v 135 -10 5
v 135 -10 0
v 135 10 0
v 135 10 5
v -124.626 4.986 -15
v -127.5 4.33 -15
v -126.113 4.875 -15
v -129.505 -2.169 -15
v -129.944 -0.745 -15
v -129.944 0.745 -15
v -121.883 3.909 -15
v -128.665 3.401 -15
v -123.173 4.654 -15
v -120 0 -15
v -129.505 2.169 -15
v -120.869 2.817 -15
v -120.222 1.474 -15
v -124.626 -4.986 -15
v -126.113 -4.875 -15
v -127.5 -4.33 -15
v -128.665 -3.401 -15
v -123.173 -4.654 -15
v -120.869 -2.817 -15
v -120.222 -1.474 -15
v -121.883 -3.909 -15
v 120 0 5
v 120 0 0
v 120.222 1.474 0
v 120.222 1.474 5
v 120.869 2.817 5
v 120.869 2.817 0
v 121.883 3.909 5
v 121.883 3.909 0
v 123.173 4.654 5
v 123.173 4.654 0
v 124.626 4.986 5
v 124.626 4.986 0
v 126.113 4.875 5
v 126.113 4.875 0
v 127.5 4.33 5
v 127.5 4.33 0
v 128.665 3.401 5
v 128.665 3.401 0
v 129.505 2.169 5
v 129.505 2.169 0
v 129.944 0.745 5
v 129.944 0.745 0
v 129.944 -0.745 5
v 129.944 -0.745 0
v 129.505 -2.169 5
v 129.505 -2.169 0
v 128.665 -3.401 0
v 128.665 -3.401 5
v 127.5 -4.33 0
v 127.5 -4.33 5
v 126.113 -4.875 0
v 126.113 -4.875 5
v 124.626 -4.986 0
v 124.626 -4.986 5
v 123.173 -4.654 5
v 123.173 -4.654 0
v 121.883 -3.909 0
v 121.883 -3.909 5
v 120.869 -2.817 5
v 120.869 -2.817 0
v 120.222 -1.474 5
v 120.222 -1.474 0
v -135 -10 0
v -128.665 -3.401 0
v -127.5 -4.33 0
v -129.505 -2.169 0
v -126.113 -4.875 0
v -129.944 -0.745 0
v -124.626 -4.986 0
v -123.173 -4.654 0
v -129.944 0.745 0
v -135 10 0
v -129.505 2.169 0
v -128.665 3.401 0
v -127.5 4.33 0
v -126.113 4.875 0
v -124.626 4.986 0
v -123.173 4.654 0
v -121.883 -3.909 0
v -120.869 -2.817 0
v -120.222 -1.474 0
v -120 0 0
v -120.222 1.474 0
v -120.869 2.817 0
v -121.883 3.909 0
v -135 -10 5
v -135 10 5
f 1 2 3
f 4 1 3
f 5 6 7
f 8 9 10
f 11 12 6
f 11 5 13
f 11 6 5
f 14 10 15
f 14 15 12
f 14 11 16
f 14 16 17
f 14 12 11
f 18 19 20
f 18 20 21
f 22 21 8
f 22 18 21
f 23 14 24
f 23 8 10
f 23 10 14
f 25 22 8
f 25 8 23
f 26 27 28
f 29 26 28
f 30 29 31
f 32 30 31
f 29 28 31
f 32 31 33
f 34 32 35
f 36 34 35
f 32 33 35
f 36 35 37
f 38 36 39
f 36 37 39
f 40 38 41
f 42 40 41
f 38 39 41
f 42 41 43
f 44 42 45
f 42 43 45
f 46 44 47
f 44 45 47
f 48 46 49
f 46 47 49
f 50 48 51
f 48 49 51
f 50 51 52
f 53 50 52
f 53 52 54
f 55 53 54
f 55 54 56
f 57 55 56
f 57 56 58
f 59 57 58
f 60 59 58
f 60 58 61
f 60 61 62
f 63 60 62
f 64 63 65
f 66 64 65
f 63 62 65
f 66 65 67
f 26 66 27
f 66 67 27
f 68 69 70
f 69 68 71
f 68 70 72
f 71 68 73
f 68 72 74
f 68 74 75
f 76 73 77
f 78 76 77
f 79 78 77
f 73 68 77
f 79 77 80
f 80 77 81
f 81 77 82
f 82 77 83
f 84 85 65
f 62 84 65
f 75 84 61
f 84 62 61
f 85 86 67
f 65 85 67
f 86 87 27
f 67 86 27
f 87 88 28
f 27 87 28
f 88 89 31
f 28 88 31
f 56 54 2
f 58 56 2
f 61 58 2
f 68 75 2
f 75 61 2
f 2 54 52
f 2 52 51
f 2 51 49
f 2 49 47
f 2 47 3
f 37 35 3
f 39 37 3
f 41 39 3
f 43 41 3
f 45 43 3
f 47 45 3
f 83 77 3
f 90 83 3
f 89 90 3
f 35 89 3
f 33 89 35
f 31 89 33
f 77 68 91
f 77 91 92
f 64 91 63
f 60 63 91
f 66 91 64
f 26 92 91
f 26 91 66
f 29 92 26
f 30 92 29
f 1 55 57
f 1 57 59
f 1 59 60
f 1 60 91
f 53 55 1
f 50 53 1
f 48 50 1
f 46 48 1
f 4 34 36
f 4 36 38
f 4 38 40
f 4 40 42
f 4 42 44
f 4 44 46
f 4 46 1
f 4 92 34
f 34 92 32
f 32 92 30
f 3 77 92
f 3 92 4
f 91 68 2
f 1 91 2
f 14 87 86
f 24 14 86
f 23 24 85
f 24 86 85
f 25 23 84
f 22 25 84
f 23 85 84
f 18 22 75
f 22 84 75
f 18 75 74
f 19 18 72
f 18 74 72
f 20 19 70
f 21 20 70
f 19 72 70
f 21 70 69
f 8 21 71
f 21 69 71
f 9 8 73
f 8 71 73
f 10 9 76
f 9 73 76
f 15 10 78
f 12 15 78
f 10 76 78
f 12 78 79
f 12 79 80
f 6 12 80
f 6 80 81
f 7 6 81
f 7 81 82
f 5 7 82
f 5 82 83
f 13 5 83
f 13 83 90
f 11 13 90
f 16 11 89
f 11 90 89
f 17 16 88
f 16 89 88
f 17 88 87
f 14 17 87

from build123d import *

# Parameters (mm, degrees)
SKETCH1_W           = 270
SKETCH1_H           = 20
BOSS_EXTRUDE1_DEPTH = 5
SKETCH2_R           = 5
CUT_EXTRUDE1_DEPTH  = 5
SKETCH3_R           = 5
BOSS_EXTRUDE2_DEPTH = 15


with BuildPart() as part:
    # Sketch1 → Boss-Extrude1 (new body)
    with BuildSketch(Plane.XY):
        Rectangle(SKETCH1_W, SKETCH1_H)
    extrude(amount=BOSS_EXTRUDE1_DEPTH)

    # Sketch2 → Cut-Extrude1 (cut)
    with BuildSketch(Plane(origin=(0, 0, 0), x_dir=(-1, 0, 0), z_dir=(0, 0, -1))):
        with Locations((-125, 0)):
            Circle(SKETCH2_R)
    extrude(amount=-CUT_EXTRUDE1_DEPTH, mode=Mode.SUBTRACT)

    # Sketch3 → Boss-Extrude2 (add)
    with BuildSketch(Plane(origin=(0, 0, 0), x_dir=(-1, 0, 0), z_dir=(0, 0, -1))):
        with Locations(Location((125, 0, 0), (0, 0, 180))):
            Circle(SKETCH3_R)
    extrude(amount=BOSS_EXTRUDE2_DEPTH)


solid = part.part
